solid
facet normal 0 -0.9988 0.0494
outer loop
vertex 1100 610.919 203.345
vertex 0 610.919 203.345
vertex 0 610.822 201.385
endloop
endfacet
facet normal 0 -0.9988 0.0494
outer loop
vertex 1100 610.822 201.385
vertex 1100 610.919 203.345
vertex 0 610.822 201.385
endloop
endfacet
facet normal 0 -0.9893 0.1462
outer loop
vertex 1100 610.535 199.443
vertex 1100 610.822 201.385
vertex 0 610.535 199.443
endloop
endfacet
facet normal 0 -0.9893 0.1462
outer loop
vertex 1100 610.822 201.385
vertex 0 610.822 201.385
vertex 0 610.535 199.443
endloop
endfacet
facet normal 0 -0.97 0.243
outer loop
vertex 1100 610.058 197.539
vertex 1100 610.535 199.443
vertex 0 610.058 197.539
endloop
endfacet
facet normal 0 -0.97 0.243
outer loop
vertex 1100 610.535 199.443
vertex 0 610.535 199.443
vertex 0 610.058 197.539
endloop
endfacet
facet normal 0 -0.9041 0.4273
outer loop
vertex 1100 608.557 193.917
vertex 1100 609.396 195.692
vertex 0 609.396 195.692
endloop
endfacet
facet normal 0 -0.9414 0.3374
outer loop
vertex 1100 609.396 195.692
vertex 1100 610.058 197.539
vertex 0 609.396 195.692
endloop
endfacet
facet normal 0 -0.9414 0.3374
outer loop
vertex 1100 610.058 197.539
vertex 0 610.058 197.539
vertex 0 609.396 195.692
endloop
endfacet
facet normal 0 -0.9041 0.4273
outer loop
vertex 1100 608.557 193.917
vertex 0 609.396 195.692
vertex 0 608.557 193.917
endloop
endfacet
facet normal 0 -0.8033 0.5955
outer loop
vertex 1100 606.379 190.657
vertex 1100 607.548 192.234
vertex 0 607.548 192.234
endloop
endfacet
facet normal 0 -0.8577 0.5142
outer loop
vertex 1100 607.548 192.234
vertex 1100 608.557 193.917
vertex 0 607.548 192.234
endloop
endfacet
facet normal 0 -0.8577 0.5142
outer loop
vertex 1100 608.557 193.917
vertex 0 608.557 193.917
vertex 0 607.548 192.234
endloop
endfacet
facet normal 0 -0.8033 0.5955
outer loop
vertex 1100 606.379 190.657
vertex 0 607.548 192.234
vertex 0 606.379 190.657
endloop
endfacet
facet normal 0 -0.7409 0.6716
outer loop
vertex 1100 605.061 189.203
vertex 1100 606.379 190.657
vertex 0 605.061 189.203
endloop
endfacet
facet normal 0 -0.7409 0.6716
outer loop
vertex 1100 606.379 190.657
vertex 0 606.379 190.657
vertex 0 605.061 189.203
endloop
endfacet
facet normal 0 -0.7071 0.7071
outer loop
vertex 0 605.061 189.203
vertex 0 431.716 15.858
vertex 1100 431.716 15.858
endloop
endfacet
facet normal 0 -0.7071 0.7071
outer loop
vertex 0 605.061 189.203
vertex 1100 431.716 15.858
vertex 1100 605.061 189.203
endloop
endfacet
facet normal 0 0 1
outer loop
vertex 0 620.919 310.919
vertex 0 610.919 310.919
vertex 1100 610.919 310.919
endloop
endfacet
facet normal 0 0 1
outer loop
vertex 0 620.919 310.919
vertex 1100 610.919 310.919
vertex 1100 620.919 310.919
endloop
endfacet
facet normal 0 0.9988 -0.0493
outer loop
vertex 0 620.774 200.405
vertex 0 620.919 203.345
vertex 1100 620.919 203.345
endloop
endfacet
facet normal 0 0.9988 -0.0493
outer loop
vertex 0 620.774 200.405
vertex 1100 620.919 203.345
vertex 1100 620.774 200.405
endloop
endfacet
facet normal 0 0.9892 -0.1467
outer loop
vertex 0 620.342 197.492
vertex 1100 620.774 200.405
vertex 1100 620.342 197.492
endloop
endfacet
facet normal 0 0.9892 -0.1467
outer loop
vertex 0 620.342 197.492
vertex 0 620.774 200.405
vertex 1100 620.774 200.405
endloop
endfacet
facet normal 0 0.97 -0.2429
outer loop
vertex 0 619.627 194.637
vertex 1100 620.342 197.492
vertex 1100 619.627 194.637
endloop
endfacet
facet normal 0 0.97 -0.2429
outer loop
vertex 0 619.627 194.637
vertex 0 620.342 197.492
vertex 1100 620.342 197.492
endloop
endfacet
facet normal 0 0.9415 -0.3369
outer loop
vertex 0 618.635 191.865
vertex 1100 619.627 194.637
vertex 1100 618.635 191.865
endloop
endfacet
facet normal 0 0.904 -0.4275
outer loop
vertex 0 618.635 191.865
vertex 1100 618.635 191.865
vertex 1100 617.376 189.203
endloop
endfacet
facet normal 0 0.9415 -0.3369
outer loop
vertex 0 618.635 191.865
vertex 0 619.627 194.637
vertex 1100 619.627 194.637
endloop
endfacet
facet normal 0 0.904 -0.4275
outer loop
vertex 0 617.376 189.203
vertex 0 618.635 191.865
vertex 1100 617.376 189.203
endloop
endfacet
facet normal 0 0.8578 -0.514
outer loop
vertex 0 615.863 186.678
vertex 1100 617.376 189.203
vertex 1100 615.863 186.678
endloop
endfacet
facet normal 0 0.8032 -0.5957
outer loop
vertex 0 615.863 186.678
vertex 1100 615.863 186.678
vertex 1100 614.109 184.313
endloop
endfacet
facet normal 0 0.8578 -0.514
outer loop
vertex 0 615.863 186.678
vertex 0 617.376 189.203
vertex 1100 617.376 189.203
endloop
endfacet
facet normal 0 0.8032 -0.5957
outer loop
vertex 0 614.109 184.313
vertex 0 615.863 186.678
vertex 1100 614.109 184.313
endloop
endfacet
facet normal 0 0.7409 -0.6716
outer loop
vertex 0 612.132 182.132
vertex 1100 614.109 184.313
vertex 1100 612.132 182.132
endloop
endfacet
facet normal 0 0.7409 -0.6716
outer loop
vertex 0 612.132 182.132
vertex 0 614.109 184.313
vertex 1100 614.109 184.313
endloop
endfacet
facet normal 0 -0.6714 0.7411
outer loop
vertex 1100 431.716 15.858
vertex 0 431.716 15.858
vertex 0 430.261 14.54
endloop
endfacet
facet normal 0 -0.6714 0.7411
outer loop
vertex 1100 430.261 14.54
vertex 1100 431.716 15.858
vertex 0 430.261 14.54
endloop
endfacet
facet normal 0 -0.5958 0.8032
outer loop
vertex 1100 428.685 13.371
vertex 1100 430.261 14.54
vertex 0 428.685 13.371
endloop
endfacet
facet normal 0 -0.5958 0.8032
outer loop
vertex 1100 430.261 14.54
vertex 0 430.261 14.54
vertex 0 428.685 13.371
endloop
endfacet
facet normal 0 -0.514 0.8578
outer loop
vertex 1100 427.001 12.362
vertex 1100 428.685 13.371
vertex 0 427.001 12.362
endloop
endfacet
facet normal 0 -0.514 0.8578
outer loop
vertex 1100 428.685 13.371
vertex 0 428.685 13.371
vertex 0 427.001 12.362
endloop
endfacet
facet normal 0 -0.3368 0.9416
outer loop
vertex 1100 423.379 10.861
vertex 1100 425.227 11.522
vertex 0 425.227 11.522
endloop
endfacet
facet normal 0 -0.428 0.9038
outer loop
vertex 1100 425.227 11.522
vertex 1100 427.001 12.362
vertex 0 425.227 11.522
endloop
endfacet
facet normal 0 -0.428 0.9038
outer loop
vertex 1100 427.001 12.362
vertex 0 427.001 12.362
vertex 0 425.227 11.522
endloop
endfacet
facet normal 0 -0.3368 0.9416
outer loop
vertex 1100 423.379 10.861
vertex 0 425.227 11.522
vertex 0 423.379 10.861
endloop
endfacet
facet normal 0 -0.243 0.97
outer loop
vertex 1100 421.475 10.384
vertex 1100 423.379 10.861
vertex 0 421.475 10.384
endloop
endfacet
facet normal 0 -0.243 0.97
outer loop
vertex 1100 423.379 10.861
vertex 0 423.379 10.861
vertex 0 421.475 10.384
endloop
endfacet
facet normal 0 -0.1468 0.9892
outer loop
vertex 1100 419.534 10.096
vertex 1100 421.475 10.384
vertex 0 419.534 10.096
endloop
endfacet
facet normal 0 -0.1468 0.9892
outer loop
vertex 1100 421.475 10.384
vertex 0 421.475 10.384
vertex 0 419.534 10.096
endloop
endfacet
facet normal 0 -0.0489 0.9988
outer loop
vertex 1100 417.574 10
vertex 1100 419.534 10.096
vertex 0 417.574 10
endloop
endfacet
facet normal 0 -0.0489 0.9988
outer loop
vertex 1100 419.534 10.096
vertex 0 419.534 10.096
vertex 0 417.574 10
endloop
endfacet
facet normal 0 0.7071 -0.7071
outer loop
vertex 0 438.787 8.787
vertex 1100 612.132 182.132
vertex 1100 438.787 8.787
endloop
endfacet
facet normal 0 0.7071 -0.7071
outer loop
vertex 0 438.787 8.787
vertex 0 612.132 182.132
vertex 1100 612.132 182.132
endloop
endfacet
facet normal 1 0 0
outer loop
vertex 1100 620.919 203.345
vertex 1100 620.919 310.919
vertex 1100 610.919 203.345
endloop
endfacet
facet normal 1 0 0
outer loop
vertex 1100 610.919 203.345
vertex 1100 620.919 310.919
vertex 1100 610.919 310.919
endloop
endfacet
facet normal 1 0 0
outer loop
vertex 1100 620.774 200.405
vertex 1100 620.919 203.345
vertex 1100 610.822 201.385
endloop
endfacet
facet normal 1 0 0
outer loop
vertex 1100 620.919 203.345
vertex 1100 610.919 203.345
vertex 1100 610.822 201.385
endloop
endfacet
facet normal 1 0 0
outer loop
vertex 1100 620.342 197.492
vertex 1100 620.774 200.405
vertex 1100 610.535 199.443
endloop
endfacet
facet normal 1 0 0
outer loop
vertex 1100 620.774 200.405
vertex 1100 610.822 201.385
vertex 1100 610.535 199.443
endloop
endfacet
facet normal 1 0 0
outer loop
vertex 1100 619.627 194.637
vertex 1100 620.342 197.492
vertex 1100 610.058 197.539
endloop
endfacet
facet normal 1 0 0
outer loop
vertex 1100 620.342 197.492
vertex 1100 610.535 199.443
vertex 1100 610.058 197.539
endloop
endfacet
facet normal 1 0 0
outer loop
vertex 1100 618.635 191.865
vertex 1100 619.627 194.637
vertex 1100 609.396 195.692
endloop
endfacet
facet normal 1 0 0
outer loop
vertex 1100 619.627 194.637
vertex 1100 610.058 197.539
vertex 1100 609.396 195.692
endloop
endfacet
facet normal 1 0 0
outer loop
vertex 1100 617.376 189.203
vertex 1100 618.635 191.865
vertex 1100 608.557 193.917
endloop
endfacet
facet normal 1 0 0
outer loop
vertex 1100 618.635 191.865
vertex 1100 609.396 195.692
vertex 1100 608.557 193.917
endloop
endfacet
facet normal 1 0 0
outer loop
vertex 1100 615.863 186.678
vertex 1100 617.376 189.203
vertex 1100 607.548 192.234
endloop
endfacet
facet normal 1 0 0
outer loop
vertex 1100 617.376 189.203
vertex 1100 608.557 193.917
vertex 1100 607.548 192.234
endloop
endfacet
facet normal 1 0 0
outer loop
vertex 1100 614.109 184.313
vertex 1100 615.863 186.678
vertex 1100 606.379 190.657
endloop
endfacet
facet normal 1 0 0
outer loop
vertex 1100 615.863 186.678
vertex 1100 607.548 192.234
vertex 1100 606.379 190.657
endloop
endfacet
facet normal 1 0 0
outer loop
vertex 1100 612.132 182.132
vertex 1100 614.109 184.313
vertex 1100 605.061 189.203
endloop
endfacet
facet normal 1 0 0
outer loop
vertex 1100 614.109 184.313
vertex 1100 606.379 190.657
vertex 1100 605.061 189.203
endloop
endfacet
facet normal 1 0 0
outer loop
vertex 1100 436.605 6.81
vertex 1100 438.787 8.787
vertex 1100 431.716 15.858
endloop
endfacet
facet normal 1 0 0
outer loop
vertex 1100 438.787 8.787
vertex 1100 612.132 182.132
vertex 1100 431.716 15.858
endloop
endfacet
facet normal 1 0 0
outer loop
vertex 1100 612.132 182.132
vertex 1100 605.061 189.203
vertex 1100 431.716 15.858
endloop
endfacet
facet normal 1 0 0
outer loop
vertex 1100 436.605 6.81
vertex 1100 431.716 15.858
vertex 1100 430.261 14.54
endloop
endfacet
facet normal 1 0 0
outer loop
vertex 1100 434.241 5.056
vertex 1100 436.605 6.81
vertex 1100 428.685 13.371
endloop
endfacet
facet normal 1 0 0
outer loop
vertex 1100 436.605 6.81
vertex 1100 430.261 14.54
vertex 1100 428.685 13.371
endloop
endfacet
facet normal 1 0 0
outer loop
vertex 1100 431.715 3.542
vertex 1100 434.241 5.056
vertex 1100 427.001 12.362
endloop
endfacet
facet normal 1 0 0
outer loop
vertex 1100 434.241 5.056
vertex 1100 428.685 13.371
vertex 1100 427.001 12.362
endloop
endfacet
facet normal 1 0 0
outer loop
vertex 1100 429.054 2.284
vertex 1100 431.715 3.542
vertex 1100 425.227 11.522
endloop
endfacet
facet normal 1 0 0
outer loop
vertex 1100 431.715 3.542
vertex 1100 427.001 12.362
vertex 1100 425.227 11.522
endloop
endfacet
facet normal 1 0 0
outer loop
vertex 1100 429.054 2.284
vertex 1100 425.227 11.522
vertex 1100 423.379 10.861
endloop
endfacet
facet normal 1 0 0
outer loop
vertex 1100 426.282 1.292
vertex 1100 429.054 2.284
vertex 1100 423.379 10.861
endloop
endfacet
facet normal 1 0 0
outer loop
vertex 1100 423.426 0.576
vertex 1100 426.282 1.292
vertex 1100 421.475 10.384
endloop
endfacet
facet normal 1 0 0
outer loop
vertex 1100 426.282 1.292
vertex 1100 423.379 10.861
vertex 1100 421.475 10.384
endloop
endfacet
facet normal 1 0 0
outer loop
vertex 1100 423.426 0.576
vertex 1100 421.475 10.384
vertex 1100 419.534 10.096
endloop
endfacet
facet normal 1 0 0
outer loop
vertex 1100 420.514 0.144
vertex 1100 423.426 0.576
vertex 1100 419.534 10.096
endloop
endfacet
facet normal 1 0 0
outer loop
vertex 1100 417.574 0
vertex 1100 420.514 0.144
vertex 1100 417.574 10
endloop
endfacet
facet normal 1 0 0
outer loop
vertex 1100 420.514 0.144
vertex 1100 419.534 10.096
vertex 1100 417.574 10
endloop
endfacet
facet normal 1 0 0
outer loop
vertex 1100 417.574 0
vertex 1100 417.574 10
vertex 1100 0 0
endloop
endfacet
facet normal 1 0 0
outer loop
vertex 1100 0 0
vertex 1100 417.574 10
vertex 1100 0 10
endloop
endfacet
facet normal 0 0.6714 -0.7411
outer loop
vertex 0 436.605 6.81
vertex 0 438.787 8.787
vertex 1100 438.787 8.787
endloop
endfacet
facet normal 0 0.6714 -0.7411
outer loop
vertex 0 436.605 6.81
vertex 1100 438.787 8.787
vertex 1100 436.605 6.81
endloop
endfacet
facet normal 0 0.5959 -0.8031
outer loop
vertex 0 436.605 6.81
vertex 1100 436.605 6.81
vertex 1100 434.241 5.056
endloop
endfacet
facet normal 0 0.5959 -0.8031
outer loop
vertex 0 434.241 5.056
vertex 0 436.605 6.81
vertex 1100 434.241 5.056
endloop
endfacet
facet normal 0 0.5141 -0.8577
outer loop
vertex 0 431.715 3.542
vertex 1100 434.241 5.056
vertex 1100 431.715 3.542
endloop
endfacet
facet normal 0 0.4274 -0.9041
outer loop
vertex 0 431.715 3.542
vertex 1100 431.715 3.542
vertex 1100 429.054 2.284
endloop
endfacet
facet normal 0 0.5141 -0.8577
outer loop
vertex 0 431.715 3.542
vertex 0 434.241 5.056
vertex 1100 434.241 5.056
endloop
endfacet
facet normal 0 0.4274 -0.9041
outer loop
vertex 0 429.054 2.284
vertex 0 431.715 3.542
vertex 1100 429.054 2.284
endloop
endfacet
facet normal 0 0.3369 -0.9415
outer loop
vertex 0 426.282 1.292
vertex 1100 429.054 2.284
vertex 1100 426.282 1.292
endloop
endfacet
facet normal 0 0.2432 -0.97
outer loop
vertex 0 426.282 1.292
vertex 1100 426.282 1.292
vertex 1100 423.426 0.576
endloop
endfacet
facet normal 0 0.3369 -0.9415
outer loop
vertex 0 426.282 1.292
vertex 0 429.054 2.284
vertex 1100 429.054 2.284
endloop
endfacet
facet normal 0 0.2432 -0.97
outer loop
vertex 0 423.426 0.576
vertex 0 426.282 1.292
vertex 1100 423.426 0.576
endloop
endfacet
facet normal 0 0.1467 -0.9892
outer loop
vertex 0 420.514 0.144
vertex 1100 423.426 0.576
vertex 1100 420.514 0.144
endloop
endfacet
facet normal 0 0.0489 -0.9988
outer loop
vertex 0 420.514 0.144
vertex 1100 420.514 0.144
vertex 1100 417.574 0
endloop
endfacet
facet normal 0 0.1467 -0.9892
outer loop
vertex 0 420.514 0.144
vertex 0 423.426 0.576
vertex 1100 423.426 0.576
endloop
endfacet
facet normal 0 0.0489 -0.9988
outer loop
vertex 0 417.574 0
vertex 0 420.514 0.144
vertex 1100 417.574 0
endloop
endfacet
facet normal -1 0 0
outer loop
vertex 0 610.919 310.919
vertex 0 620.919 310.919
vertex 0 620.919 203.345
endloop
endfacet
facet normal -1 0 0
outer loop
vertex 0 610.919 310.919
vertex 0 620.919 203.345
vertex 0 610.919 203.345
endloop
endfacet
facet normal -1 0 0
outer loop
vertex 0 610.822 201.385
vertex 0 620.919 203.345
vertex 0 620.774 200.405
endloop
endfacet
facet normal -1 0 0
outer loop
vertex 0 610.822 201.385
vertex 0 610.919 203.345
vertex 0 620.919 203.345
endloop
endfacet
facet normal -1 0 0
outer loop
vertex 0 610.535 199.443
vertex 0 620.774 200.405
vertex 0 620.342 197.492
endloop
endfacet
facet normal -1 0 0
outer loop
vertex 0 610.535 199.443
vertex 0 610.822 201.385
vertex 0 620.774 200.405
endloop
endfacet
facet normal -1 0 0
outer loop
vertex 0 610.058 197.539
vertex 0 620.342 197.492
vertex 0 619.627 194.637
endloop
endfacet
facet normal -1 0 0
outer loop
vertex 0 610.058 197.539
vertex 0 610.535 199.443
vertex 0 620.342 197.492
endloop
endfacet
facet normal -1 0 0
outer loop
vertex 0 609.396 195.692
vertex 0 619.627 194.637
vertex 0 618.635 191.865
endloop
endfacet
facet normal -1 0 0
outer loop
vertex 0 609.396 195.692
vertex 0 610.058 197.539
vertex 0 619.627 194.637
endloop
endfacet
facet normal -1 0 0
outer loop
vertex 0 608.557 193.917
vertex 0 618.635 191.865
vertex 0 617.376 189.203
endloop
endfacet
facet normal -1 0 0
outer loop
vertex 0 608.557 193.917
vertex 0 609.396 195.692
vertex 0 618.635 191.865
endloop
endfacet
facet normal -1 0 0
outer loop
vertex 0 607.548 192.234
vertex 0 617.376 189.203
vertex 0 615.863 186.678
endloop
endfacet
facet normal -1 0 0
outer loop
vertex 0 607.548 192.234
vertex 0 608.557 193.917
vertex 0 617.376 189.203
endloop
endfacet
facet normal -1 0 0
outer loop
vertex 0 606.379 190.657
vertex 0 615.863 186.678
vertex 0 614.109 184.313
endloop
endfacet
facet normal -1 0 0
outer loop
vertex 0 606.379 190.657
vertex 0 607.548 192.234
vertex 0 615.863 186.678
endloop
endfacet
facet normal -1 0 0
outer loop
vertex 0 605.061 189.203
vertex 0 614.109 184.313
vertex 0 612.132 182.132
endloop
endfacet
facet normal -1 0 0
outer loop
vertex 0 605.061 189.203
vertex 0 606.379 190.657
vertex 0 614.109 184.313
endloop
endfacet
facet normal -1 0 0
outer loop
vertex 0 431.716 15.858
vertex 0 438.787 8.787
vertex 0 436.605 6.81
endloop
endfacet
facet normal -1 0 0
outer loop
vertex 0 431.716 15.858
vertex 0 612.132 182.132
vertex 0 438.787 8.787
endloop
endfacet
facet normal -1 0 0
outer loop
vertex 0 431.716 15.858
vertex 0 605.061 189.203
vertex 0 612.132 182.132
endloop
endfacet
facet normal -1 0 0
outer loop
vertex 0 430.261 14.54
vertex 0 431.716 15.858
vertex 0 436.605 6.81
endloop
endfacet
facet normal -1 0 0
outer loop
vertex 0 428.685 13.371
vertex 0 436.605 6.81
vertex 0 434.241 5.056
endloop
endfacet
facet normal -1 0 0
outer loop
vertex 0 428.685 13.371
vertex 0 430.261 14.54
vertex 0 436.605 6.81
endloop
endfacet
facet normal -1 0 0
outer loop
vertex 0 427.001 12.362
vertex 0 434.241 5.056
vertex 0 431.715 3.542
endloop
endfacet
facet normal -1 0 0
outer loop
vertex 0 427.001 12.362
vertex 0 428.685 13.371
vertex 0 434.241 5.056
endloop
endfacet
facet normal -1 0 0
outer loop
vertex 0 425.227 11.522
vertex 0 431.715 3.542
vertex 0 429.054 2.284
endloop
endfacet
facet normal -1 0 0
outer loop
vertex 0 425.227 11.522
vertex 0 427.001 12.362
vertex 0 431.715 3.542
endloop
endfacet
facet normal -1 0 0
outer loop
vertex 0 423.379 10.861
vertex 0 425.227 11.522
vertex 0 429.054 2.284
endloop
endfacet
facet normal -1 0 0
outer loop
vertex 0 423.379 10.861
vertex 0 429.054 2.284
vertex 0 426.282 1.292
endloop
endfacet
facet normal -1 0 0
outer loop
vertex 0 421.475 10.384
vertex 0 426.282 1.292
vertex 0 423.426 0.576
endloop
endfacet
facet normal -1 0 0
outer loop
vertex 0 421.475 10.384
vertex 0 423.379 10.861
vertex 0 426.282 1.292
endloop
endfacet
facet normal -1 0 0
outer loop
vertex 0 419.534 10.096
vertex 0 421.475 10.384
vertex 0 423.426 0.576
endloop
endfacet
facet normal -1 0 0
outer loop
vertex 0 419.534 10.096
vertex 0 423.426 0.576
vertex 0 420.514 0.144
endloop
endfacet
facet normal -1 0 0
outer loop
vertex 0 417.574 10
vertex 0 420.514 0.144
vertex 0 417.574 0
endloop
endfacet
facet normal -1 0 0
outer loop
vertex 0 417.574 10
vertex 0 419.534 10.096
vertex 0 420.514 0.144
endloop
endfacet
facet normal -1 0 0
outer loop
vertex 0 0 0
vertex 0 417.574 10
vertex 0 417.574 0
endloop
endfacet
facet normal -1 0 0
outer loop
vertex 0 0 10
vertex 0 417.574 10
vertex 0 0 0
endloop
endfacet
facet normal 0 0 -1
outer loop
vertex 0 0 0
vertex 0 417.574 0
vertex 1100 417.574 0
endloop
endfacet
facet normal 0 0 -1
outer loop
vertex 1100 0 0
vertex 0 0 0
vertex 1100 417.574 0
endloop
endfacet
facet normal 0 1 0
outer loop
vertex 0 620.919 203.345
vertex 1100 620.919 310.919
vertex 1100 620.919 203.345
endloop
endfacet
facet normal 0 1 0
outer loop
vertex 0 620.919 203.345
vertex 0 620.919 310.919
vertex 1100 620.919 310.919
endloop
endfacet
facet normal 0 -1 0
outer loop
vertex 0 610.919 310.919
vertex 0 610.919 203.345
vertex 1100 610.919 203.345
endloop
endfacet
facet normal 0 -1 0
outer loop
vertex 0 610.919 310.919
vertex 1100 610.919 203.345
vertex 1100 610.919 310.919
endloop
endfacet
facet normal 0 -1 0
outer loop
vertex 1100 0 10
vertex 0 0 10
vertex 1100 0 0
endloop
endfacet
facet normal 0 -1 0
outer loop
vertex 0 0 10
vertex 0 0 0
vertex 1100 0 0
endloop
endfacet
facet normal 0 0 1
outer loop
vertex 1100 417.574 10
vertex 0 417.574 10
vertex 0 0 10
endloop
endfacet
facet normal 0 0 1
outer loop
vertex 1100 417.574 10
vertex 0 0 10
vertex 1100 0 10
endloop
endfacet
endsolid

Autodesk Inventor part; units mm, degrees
ref_plane "YZ Plane" through (0, 0, 0) normal (1, 0, 0) x (0, 1, 0)
ref_plane "XZ Plane" through (0, 0, 0) normal (0, 1, 0) x (-1, 0, 0)
ref_plane "XY Plane" through (0, 0, 0) normal (0, 0, 1) x (1, 0, 0)
sketch "Sketch1" plane through (0, 0, 0) normal (0, 0, 1) x (1, 0, 0)
  line L0 (0, 0) -> (1100, 0)
  line L1 (1100, 0) -> (1100, 430)
  line L2 (1100, 430) -> (0, 430)
  line L3 (0, 430) -> (0, 0)
  dimension "d0" = 1100
  dimension "d1" = 430
extrude "Plate1" add sketch "Sketch1" along normal blind 10
sketch "Sketch2" plane through (0, 422.9289, 7.0711) normal (0, 0.7071068, -0.7071068) x (-1, 0, 0)
  line L0 (-1100, 0) -> (0, 0)
  line L1 (0, 0) -> (0, 270)
  line L2 (0, 270) -> (-1100, 270)
  line L3 (-1100, 270) -> (-1100, 0)
edge flange "Flange1" height 270 angle 45 thickness 10 bend radius 20 thickness toward (0, 0.7071068, -0.7071068) relief tear relief width 10 relief depth 5 edges at (550, 430, 10) wall of the first edge with corners at (1100, 422.9289, 7.0711) (0, 422.9289, 7.0711) (0, 613.8478, 197.9899) (1100, 613.8478, 197.9899)
bend "Bend1"
corner "Corner1"
sketch "Sketch3" plane through (0, 610.9188, 190.9188) normal (0, 1, 0) x (-1, 0, 0)
  line L0 (-1100, 0) -> (0, 0)
  line L1 (0, 0) -> (0, 120)
  line L2 (0, 120) -> (-1100, 120)
  line L3 (-1100, 120) -> (-1100, 0)
edge flange "Flange2" height 120 angle 45 thickness 10 bend radius 20 thickness toward (0, 1, 0) relief tear relief width 10 relief depth 5 edges at (550, 613.8478, 197.9899) wall of the first edge with corners at (1100, 610.9188, 190.9188) (0, 610.9188, 190.9188) (0, 610.9188, 310.9188) (1100, 610.9188, 310.9188)
bend "Bend2"
corner "Corner2"
equation "\"d2\" = Thickness"
equation "\"d3\" = BendReliefWidth"
equation "\"d4\" = BendReliefDepth"
equation "\"d5\" = MinimumRemnant"
equation "\"d6\" = TransitionRadius"
equation "\"d10\" = CornerReliefSize"
equation "\"d11\" = GapSize"
equation "\"d12\" = JacobiRadiusSize"
equation "\"d13\" = BendReliefWidth"
equation "\"d14\" = BendReliefDepth"
equation "\"d15\" = MinimumRemnant"
equation "\"d16\" = TransitionRadius"
equation "\"d20\" = CornerReliefSize"
equation "\"d21\" = GapSize"
equation "\"d22\" = JacobiRadiusSize"
equation "\"BendReliefDepth\" = 0.5 * Thickness"
equation "\"Thickness\" = 10"
equation "\"BendReliefWidth\" = 10"
equation "\"MinimumRemnant\" = 20"
equation "\"TransitionRadius\" = 10"
equation "\"CornerReliefSize\" = 40"
equation "\"GapSize\" = 10"
equation "\"JacobiRadiusSize\" = 10"
properties part number "10mm Polycarb" material "Polycarbonate, Clear"
